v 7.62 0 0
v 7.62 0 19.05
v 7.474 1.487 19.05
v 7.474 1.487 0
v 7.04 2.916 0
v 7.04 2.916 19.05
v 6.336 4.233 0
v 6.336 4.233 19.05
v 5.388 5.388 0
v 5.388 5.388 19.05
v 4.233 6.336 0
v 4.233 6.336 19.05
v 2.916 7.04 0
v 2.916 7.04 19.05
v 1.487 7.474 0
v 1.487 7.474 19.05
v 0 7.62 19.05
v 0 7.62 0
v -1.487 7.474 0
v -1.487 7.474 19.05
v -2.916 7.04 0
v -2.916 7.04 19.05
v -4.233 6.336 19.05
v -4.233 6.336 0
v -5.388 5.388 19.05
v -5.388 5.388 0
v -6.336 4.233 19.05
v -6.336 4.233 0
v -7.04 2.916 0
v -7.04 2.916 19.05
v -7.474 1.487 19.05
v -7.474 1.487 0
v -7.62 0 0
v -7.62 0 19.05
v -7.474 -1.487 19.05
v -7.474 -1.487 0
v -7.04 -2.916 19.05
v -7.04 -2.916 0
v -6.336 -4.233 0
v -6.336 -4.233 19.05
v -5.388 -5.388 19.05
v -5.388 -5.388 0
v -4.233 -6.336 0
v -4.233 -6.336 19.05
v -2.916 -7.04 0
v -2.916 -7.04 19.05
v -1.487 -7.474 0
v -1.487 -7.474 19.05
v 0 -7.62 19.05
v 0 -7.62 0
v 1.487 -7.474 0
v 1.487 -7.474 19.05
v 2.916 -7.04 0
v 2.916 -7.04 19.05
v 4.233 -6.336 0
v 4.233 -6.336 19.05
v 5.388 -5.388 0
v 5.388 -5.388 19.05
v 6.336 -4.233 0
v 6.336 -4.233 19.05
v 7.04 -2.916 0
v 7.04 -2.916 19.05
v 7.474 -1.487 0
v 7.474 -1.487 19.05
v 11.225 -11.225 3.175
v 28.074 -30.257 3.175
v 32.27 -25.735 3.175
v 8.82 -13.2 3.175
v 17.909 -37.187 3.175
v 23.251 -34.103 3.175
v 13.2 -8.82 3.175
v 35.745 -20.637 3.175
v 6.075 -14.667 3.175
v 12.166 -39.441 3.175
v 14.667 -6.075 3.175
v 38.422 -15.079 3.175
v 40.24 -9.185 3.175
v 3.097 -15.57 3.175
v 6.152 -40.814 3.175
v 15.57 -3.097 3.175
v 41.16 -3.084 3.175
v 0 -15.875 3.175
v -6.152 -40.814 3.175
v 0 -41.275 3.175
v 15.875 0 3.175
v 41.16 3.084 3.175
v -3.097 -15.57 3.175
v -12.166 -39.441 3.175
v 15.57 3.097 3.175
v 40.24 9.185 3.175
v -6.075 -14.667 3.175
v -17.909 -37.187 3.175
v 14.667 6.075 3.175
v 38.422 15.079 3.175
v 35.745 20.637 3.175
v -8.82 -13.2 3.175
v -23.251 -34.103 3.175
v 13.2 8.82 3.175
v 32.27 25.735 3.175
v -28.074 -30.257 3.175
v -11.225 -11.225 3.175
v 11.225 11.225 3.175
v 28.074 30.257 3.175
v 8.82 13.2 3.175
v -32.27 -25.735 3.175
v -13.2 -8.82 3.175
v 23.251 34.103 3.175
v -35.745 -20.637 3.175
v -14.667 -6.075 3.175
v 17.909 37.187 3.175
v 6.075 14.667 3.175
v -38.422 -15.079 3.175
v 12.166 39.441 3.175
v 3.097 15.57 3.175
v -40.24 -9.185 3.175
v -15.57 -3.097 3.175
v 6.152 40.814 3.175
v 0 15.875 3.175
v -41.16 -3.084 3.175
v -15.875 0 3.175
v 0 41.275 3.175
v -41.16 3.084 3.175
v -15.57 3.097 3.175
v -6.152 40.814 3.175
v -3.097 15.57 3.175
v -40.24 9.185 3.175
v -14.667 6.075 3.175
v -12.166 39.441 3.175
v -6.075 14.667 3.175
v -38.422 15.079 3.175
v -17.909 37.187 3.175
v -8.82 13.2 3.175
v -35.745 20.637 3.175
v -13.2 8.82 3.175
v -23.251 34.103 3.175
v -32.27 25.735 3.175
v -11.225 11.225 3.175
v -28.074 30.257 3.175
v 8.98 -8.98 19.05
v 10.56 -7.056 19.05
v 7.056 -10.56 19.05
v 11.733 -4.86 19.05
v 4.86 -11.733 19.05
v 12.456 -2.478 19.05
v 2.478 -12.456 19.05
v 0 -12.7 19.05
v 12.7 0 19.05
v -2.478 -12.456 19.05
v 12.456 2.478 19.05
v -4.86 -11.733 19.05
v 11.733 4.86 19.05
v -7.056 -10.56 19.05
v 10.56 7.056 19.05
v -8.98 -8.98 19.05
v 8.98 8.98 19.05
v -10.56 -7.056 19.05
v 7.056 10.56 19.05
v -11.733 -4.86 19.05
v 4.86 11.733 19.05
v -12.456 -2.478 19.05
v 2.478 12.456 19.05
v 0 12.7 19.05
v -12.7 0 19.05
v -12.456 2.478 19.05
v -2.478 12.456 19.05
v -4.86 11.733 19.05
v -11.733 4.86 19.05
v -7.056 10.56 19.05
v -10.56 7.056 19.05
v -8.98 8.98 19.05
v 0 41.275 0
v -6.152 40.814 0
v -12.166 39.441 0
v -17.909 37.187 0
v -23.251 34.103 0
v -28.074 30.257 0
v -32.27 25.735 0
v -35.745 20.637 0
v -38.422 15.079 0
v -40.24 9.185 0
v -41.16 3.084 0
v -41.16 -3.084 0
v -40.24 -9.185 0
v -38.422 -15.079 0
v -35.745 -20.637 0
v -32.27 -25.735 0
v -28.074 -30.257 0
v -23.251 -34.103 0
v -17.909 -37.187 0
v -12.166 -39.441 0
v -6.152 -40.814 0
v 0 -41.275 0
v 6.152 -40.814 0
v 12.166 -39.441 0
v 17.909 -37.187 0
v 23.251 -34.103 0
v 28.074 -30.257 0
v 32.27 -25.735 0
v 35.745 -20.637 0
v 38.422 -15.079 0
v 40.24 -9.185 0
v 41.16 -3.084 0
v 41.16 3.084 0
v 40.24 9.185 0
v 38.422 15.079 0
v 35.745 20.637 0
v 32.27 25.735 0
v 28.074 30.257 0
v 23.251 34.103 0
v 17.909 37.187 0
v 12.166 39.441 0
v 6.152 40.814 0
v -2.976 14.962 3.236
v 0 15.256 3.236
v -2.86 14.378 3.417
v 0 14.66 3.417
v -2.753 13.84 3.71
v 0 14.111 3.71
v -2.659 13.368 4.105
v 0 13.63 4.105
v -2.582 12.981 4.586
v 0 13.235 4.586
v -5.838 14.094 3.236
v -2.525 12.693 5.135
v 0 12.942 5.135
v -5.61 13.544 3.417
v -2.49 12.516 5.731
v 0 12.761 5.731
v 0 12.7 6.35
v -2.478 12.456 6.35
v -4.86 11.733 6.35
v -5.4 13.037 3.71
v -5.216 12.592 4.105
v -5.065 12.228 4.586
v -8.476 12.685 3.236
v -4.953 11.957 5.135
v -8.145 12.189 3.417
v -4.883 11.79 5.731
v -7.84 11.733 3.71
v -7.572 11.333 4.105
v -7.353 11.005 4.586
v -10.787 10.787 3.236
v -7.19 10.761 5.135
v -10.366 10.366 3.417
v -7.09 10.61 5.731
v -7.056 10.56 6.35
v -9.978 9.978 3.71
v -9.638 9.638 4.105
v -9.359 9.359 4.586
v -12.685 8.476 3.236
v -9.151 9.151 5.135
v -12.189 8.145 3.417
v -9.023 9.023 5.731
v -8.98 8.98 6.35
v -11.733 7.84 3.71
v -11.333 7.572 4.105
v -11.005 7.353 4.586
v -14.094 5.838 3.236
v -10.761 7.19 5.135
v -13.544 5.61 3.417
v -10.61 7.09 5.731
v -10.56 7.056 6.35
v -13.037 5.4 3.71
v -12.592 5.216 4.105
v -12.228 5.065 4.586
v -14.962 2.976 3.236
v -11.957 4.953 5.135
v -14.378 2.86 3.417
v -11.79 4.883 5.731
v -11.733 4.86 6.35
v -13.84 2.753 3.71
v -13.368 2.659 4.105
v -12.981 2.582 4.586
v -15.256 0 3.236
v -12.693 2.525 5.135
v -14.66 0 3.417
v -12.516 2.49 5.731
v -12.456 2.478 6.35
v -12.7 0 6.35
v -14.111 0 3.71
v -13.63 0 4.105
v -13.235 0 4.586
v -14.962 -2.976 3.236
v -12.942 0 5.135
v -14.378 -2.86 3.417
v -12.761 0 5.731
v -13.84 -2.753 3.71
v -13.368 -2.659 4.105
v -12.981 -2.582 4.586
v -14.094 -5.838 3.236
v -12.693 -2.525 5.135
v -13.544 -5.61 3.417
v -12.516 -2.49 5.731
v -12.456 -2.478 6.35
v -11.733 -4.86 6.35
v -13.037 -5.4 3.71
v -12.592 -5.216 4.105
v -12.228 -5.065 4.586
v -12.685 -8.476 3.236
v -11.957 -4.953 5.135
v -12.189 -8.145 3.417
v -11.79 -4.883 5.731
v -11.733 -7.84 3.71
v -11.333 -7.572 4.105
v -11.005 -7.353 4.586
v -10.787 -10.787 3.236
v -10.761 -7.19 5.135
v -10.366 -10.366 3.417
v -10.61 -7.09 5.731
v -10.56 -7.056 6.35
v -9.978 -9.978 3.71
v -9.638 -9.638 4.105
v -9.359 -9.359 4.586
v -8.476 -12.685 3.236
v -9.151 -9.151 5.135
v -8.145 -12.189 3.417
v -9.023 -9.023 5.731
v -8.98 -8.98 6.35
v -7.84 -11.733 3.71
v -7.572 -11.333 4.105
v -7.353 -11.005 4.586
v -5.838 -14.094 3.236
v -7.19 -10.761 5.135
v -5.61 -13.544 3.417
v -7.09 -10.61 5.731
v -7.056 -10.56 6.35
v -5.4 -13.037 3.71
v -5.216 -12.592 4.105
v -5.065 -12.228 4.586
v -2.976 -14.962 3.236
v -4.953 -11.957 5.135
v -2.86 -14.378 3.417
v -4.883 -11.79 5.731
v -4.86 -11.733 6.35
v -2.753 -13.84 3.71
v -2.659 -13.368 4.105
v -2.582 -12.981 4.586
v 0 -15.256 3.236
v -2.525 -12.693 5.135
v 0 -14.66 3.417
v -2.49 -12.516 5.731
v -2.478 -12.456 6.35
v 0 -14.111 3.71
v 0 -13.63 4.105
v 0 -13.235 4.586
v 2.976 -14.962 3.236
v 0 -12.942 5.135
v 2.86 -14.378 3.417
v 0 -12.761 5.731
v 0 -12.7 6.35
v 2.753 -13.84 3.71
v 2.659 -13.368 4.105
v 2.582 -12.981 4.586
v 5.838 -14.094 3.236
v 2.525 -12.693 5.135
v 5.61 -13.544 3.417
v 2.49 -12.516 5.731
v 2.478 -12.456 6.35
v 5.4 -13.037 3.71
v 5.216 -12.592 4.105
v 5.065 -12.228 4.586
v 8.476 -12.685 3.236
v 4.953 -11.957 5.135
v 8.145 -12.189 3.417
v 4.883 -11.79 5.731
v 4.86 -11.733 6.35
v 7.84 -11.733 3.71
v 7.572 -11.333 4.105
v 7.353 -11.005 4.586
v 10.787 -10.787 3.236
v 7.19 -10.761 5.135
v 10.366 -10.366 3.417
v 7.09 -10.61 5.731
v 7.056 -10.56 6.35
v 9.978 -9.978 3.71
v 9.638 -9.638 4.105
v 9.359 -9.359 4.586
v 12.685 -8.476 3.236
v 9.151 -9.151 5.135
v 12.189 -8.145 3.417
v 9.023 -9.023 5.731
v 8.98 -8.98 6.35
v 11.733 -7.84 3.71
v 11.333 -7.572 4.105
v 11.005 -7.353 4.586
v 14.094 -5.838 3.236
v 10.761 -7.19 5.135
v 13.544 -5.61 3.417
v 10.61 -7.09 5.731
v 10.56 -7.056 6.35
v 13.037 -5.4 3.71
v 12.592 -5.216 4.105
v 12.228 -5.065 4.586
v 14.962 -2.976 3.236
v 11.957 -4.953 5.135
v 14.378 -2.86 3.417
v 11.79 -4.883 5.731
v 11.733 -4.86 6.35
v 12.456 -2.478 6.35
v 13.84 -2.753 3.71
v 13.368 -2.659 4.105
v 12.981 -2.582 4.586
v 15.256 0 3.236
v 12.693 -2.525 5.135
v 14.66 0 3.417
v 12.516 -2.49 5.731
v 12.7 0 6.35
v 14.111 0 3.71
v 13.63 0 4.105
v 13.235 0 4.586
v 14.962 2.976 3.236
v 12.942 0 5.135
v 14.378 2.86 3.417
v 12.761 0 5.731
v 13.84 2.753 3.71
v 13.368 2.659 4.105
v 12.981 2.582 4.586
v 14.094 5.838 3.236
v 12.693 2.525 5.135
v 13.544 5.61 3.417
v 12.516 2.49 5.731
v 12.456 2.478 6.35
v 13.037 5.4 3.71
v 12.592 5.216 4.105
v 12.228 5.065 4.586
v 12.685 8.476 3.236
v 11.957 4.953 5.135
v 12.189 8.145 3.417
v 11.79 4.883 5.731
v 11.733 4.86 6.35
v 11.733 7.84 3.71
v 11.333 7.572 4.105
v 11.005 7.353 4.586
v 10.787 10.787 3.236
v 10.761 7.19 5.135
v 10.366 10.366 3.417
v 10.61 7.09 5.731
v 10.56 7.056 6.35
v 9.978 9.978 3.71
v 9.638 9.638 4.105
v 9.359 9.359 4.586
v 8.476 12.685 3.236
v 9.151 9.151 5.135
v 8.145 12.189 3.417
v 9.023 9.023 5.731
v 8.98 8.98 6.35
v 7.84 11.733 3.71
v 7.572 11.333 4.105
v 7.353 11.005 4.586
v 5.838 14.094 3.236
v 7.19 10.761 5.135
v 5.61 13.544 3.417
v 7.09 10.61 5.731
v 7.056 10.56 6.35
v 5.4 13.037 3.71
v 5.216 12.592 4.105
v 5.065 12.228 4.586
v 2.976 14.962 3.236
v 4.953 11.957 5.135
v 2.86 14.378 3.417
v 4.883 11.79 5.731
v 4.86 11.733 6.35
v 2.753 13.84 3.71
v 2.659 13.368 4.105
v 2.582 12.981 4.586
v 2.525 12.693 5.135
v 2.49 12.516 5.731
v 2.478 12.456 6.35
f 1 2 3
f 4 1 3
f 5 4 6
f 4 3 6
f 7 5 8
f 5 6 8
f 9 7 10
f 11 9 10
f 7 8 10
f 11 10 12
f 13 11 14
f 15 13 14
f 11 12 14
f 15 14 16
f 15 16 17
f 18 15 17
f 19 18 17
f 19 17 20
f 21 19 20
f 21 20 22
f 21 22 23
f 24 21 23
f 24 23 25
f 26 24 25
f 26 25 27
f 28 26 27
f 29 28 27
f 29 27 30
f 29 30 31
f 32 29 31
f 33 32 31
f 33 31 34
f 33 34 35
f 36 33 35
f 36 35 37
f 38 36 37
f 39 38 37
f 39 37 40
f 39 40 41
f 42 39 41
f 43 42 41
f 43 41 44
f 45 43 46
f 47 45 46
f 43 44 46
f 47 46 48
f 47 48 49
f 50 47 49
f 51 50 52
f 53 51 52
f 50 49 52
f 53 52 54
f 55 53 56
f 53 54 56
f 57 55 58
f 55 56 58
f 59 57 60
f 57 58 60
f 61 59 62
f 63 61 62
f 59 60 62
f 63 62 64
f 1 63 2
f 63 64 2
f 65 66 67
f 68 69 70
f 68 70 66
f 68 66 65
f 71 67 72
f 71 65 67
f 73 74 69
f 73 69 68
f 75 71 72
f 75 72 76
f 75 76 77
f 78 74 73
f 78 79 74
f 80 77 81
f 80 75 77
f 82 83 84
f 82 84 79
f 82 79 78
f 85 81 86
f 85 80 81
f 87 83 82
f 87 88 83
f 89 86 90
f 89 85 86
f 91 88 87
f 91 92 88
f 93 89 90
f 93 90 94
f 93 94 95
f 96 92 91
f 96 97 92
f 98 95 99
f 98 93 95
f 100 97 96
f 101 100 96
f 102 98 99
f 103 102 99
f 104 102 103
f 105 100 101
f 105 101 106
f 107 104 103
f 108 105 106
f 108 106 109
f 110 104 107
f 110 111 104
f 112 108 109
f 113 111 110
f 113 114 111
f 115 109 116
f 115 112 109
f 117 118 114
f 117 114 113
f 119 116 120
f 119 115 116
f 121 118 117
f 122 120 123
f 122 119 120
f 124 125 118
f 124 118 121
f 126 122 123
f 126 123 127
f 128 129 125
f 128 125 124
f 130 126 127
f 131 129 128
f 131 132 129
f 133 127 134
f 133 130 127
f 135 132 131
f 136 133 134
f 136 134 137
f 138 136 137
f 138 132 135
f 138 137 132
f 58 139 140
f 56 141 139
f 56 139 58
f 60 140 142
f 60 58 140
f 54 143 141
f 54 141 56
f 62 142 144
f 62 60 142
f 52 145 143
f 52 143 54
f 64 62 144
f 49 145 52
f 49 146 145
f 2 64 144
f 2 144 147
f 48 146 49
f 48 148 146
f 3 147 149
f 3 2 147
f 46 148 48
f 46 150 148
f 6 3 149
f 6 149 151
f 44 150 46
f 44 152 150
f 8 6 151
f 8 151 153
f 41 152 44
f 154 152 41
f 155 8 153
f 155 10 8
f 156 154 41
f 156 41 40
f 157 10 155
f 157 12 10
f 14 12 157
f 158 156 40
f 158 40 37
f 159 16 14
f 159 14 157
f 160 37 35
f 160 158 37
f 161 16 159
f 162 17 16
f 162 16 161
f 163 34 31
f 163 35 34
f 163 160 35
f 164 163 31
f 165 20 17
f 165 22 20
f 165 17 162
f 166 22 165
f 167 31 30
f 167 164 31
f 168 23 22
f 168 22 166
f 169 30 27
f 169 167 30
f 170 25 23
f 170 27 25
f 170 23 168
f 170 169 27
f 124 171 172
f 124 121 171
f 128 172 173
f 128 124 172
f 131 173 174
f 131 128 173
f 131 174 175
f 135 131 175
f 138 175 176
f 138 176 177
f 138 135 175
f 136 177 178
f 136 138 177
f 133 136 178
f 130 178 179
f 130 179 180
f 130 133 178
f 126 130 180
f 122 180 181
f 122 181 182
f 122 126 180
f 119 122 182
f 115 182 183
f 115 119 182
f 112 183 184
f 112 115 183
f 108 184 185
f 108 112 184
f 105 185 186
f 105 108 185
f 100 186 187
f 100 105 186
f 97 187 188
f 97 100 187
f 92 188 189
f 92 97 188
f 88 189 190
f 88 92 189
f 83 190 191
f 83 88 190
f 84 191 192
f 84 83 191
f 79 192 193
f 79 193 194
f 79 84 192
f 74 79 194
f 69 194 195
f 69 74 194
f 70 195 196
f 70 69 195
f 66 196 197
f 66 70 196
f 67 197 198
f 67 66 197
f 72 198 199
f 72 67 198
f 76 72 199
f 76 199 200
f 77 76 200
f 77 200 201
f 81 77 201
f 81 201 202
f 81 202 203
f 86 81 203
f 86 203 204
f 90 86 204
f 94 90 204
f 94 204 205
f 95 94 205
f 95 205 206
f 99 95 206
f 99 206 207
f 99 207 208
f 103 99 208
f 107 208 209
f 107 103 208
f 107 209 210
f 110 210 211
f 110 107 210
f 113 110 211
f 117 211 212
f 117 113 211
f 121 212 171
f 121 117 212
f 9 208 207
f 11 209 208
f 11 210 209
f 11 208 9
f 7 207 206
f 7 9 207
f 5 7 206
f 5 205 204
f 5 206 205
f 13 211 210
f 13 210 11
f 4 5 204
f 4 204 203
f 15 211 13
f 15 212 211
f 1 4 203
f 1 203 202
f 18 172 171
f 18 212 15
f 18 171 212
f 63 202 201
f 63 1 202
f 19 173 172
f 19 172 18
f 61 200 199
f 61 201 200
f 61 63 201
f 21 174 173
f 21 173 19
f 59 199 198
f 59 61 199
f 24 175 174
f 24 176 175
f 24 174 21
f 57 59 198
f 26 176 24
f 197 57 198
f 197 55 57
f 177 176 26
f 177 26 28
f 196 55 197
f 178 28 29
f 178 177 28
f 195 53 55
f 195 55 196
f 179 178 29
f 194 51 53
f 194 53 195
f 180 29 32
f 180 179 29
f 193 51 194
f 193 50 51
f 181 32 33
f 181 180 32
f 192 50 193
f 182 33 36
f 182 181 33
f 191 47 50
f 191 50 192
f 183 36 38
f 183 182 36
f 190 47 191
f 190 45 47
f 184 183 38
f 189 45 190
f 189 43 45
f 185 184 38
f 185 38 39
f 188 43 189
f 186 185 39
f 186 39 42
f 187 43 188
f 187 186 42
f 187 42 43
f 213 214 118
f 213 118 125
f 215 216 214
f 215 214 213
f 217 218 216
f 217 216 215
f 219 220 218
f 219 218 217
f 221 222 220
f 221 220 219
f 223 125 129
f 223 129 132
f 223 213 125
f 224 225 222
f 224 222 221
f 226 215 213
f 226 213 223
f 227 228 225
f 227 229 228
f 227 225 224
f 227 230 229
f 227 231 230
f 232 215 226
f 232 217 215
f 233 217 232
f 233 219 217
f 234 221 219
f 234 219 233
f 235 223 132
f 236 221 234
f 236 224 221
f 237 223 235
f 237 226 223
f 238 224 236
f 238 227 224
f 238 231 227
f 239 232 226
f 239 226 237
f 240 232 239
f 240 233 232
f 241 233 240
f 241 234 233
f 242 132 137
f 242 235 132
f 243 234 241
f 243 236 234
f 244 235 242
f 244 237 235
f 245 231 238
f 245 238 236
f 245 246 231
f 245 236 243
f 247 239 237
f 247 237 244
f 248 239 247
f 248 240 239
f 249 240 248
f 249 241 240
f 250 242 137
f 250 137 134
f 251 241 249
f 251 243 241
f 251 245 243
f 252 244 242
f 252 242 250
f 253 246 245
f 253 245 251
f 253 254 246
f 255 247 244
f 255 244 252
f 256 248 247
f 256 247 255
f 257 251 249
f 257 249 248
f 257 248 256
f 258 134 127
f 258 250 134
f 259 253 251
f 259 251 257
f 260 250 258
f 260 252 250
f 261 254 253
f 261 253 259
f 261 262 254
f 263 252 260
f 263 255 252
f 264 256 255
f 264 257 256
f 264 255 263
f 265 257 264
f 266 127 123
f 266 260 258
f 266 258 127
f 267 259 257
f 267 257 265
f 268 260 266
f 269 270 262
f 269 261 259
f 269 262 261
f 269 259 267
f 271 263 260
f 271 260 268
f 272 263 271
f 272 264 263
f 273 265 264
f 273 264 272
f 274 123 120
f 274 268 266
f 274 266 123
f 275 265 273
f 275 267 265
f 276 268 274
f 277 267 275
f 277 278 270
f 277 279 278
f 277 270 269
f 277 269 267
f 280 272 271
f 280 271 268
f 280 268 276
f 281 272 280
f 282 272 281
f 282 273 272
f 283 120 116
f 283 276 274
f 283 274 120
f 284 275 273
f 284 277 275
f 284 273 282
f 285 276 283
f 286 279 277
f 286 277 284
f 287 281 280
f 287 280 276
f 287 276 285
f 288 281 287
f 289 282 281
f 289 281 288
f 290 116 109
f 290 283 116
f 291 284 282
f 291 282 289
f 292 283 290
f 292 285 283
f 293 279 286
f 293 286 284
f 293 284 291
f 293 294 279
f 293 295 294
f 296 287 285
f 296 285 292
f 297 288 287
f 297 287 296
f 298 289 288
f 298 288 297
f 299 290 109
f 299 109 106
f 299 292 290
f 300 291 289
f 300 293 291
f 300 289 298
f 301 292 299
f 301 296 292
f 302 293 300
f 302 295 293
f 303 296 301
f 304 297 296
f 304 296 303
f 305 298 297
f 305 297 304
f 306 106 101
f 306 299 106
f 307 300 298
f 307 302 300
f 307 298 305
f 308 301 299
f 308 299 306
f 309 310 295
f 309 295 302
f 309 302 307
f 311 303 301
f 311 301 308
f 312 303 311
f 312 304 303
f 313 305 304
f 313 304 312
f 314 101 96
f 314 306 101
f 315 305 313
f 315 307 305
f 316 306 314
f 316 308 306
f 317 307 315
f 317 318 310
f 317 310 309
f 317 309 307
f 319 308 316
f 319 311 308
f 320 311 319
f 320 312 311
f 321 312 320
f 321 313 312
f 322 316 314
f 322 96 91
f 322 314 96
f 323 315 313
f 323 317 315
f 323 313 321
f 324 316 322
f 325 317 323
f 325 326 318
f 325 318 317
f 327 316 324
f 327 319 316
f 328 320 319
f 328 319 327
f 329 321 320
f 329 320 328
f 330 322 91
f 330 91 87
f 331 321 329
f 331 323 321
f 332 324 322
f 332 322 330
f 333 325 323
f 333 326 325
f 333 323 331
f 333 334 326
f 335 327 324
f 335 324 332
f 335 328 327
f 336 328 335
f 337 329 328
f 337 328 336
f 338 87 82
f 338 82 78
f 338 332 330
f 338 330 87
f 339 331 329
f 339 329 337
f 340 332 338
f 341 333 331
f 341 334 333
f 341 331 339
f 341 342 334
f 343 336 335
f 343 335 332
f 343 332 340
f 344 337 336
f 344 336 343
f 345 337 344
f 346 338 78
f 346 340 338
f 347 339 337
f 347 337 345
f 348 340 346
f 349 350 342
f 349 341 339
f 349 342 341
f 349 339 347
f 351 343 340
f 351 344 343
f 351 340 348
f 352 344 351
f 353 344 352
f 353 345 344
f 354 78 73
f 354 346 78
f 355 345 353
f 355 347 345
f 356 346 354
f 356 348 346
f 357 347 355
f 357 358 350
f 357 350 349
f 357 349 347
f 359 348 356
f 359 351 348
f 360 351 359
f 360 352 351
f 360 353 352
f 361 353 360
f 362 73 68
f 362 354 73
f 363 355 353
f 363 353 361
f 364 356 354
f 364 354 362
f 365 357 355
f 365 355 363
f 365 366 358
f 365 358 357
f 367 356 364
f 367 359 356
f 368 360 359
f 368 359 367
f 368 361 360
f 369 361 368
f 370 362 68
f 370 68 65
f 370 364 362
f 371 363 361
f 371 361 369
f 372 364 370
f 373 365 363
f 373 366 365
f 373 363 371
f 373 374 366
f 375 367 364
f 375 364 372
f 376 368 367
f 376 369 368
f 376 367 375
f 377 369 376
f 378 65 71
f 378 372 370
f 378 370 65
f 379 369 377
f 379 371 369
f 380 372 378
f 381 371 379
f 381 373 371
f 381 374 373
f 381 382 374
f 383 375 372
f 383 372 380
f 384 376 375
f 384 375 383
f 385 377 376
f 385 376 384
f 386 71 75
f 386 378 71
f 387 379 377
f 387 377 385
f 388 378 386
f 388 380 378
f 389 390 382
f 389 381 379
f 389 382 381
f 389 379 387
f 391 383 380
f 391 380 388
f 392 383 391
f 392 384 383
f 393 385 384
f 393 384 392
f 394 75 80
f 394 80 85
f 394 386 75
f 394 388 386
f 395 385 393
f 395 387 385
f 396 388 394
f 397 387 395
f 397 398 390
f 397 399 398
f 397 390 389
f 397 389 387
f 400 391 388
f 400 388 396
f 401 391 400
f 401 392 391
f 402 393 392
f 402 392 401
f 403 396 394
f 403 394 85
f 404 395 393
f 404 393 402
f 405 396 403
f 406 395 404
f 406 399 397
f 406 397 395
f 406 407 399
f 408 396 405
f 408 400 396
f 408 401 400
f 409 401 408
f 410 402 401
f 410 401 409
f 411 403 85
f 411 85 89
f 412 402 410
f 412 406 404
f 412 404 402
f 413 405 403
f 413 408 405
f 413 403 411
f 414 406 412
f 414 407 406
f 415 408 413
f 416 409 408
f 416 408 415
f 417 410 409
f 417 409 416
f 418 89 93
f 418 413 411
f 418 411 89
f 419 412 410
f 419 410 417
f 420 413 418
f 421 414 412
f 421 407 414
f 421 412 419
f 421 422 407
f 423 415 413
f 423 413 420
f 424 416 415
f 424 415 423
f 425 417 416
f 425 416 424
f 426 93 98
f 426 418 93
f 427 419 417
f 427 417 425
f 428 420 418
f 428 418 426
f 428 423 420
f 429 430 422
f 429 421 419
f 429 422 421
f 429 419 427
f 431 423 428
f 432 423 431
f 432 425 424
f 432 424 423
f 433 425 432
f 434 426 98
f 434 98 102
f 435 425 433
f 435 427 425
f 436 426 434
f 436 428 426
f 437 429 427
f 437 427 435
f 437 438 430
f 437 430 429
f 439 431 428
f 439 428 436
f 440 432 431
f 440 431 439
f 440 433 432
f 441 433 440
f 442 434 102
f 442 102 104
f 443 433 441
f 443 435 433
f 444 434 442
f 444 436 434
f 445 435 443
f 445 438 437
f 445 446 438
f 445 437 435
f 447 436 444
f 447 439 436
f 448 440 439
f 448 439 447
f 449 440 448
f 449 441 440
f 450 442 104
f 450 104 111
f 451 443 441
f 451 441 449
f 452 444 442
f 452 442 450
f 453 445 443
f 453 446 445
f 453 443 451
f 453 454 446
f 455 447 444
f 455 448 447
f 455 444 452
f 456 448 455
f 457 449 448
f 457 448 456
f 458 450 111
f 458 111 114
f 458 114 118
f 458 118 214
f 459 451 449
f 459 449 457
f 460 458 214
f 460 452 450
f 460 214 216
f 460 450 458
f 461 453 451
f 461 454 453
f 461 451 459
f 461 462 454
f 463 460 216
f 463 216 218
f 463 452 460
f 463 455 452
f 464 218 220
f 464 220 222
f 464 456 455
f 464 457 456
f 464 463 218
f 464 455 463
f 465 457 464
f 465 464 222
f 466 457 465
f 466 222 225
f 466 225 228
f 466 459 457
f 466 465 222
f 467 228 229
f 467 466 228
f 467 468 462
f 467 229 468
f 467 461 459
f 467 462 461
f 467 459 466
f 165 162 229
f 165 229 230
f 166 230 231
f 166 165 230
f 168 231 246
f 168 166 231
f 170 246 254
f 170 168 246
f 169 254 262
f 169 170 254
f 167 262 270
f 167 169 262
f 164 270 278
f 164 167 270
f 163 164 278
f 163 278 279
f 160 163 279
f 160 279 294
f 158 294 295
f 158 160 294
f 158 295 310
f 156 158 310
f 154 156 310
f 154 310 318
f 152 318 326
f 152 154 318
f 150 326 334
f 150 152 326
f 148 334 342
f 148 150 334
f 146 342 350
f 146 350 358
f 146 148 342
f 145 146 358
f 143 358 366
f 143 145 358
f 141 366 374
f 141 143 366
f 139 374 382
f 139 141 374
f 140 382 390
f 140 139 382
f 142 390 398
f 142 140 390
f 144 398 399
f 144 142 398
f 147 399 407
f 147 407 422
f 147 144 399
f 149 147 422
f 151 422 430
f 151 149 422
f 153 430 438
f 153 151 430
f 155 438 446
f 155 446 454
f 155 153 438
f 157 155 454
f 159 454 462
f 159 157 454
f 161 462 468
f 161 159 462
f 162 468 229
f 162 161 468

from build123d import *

# Parameters (mm, degrees)
CUT_SKETCH_R     = 7.62
CENTER_CUT_DEPTH = 62.401577748
FILLET_2_R       = 3.175


with BuildPart() as part:
    # Revolve Sketch → Revolve 2 (revolve)
    with BuildSketch(Plane(origin=(0, 0, 0), x_dir=(0, 0, -1), z_dir=(1, 0, 0))):
        Polygon((0, 0), (0, 41.275), (-3.175, 41.275), (-3.175, 12.7), (-19.05, 12.7), (-19.05, 0), align=None)
    revolve(axis=Axis((0, 0, 0), (0, 0, 1)))

    # Cut Sketch → Center Cut (cut, through all)
    with BuildSketch(Plane.XY.offset(19.05)):
        Circle(CUT_SKETCH_R)
    extrude(amount=-CENTER_CUT_DEPTH, mode=Mode.SUBTRACT)

    # Fillet 2
    fillet_2_edges = [part.edges().sort_by_distance(p)[0] for p in [
        (0, -12.7, 3.175),
    ]]
    fillet(fillet_2_edges, radius=FILLET_2_R)


solid = part.part
